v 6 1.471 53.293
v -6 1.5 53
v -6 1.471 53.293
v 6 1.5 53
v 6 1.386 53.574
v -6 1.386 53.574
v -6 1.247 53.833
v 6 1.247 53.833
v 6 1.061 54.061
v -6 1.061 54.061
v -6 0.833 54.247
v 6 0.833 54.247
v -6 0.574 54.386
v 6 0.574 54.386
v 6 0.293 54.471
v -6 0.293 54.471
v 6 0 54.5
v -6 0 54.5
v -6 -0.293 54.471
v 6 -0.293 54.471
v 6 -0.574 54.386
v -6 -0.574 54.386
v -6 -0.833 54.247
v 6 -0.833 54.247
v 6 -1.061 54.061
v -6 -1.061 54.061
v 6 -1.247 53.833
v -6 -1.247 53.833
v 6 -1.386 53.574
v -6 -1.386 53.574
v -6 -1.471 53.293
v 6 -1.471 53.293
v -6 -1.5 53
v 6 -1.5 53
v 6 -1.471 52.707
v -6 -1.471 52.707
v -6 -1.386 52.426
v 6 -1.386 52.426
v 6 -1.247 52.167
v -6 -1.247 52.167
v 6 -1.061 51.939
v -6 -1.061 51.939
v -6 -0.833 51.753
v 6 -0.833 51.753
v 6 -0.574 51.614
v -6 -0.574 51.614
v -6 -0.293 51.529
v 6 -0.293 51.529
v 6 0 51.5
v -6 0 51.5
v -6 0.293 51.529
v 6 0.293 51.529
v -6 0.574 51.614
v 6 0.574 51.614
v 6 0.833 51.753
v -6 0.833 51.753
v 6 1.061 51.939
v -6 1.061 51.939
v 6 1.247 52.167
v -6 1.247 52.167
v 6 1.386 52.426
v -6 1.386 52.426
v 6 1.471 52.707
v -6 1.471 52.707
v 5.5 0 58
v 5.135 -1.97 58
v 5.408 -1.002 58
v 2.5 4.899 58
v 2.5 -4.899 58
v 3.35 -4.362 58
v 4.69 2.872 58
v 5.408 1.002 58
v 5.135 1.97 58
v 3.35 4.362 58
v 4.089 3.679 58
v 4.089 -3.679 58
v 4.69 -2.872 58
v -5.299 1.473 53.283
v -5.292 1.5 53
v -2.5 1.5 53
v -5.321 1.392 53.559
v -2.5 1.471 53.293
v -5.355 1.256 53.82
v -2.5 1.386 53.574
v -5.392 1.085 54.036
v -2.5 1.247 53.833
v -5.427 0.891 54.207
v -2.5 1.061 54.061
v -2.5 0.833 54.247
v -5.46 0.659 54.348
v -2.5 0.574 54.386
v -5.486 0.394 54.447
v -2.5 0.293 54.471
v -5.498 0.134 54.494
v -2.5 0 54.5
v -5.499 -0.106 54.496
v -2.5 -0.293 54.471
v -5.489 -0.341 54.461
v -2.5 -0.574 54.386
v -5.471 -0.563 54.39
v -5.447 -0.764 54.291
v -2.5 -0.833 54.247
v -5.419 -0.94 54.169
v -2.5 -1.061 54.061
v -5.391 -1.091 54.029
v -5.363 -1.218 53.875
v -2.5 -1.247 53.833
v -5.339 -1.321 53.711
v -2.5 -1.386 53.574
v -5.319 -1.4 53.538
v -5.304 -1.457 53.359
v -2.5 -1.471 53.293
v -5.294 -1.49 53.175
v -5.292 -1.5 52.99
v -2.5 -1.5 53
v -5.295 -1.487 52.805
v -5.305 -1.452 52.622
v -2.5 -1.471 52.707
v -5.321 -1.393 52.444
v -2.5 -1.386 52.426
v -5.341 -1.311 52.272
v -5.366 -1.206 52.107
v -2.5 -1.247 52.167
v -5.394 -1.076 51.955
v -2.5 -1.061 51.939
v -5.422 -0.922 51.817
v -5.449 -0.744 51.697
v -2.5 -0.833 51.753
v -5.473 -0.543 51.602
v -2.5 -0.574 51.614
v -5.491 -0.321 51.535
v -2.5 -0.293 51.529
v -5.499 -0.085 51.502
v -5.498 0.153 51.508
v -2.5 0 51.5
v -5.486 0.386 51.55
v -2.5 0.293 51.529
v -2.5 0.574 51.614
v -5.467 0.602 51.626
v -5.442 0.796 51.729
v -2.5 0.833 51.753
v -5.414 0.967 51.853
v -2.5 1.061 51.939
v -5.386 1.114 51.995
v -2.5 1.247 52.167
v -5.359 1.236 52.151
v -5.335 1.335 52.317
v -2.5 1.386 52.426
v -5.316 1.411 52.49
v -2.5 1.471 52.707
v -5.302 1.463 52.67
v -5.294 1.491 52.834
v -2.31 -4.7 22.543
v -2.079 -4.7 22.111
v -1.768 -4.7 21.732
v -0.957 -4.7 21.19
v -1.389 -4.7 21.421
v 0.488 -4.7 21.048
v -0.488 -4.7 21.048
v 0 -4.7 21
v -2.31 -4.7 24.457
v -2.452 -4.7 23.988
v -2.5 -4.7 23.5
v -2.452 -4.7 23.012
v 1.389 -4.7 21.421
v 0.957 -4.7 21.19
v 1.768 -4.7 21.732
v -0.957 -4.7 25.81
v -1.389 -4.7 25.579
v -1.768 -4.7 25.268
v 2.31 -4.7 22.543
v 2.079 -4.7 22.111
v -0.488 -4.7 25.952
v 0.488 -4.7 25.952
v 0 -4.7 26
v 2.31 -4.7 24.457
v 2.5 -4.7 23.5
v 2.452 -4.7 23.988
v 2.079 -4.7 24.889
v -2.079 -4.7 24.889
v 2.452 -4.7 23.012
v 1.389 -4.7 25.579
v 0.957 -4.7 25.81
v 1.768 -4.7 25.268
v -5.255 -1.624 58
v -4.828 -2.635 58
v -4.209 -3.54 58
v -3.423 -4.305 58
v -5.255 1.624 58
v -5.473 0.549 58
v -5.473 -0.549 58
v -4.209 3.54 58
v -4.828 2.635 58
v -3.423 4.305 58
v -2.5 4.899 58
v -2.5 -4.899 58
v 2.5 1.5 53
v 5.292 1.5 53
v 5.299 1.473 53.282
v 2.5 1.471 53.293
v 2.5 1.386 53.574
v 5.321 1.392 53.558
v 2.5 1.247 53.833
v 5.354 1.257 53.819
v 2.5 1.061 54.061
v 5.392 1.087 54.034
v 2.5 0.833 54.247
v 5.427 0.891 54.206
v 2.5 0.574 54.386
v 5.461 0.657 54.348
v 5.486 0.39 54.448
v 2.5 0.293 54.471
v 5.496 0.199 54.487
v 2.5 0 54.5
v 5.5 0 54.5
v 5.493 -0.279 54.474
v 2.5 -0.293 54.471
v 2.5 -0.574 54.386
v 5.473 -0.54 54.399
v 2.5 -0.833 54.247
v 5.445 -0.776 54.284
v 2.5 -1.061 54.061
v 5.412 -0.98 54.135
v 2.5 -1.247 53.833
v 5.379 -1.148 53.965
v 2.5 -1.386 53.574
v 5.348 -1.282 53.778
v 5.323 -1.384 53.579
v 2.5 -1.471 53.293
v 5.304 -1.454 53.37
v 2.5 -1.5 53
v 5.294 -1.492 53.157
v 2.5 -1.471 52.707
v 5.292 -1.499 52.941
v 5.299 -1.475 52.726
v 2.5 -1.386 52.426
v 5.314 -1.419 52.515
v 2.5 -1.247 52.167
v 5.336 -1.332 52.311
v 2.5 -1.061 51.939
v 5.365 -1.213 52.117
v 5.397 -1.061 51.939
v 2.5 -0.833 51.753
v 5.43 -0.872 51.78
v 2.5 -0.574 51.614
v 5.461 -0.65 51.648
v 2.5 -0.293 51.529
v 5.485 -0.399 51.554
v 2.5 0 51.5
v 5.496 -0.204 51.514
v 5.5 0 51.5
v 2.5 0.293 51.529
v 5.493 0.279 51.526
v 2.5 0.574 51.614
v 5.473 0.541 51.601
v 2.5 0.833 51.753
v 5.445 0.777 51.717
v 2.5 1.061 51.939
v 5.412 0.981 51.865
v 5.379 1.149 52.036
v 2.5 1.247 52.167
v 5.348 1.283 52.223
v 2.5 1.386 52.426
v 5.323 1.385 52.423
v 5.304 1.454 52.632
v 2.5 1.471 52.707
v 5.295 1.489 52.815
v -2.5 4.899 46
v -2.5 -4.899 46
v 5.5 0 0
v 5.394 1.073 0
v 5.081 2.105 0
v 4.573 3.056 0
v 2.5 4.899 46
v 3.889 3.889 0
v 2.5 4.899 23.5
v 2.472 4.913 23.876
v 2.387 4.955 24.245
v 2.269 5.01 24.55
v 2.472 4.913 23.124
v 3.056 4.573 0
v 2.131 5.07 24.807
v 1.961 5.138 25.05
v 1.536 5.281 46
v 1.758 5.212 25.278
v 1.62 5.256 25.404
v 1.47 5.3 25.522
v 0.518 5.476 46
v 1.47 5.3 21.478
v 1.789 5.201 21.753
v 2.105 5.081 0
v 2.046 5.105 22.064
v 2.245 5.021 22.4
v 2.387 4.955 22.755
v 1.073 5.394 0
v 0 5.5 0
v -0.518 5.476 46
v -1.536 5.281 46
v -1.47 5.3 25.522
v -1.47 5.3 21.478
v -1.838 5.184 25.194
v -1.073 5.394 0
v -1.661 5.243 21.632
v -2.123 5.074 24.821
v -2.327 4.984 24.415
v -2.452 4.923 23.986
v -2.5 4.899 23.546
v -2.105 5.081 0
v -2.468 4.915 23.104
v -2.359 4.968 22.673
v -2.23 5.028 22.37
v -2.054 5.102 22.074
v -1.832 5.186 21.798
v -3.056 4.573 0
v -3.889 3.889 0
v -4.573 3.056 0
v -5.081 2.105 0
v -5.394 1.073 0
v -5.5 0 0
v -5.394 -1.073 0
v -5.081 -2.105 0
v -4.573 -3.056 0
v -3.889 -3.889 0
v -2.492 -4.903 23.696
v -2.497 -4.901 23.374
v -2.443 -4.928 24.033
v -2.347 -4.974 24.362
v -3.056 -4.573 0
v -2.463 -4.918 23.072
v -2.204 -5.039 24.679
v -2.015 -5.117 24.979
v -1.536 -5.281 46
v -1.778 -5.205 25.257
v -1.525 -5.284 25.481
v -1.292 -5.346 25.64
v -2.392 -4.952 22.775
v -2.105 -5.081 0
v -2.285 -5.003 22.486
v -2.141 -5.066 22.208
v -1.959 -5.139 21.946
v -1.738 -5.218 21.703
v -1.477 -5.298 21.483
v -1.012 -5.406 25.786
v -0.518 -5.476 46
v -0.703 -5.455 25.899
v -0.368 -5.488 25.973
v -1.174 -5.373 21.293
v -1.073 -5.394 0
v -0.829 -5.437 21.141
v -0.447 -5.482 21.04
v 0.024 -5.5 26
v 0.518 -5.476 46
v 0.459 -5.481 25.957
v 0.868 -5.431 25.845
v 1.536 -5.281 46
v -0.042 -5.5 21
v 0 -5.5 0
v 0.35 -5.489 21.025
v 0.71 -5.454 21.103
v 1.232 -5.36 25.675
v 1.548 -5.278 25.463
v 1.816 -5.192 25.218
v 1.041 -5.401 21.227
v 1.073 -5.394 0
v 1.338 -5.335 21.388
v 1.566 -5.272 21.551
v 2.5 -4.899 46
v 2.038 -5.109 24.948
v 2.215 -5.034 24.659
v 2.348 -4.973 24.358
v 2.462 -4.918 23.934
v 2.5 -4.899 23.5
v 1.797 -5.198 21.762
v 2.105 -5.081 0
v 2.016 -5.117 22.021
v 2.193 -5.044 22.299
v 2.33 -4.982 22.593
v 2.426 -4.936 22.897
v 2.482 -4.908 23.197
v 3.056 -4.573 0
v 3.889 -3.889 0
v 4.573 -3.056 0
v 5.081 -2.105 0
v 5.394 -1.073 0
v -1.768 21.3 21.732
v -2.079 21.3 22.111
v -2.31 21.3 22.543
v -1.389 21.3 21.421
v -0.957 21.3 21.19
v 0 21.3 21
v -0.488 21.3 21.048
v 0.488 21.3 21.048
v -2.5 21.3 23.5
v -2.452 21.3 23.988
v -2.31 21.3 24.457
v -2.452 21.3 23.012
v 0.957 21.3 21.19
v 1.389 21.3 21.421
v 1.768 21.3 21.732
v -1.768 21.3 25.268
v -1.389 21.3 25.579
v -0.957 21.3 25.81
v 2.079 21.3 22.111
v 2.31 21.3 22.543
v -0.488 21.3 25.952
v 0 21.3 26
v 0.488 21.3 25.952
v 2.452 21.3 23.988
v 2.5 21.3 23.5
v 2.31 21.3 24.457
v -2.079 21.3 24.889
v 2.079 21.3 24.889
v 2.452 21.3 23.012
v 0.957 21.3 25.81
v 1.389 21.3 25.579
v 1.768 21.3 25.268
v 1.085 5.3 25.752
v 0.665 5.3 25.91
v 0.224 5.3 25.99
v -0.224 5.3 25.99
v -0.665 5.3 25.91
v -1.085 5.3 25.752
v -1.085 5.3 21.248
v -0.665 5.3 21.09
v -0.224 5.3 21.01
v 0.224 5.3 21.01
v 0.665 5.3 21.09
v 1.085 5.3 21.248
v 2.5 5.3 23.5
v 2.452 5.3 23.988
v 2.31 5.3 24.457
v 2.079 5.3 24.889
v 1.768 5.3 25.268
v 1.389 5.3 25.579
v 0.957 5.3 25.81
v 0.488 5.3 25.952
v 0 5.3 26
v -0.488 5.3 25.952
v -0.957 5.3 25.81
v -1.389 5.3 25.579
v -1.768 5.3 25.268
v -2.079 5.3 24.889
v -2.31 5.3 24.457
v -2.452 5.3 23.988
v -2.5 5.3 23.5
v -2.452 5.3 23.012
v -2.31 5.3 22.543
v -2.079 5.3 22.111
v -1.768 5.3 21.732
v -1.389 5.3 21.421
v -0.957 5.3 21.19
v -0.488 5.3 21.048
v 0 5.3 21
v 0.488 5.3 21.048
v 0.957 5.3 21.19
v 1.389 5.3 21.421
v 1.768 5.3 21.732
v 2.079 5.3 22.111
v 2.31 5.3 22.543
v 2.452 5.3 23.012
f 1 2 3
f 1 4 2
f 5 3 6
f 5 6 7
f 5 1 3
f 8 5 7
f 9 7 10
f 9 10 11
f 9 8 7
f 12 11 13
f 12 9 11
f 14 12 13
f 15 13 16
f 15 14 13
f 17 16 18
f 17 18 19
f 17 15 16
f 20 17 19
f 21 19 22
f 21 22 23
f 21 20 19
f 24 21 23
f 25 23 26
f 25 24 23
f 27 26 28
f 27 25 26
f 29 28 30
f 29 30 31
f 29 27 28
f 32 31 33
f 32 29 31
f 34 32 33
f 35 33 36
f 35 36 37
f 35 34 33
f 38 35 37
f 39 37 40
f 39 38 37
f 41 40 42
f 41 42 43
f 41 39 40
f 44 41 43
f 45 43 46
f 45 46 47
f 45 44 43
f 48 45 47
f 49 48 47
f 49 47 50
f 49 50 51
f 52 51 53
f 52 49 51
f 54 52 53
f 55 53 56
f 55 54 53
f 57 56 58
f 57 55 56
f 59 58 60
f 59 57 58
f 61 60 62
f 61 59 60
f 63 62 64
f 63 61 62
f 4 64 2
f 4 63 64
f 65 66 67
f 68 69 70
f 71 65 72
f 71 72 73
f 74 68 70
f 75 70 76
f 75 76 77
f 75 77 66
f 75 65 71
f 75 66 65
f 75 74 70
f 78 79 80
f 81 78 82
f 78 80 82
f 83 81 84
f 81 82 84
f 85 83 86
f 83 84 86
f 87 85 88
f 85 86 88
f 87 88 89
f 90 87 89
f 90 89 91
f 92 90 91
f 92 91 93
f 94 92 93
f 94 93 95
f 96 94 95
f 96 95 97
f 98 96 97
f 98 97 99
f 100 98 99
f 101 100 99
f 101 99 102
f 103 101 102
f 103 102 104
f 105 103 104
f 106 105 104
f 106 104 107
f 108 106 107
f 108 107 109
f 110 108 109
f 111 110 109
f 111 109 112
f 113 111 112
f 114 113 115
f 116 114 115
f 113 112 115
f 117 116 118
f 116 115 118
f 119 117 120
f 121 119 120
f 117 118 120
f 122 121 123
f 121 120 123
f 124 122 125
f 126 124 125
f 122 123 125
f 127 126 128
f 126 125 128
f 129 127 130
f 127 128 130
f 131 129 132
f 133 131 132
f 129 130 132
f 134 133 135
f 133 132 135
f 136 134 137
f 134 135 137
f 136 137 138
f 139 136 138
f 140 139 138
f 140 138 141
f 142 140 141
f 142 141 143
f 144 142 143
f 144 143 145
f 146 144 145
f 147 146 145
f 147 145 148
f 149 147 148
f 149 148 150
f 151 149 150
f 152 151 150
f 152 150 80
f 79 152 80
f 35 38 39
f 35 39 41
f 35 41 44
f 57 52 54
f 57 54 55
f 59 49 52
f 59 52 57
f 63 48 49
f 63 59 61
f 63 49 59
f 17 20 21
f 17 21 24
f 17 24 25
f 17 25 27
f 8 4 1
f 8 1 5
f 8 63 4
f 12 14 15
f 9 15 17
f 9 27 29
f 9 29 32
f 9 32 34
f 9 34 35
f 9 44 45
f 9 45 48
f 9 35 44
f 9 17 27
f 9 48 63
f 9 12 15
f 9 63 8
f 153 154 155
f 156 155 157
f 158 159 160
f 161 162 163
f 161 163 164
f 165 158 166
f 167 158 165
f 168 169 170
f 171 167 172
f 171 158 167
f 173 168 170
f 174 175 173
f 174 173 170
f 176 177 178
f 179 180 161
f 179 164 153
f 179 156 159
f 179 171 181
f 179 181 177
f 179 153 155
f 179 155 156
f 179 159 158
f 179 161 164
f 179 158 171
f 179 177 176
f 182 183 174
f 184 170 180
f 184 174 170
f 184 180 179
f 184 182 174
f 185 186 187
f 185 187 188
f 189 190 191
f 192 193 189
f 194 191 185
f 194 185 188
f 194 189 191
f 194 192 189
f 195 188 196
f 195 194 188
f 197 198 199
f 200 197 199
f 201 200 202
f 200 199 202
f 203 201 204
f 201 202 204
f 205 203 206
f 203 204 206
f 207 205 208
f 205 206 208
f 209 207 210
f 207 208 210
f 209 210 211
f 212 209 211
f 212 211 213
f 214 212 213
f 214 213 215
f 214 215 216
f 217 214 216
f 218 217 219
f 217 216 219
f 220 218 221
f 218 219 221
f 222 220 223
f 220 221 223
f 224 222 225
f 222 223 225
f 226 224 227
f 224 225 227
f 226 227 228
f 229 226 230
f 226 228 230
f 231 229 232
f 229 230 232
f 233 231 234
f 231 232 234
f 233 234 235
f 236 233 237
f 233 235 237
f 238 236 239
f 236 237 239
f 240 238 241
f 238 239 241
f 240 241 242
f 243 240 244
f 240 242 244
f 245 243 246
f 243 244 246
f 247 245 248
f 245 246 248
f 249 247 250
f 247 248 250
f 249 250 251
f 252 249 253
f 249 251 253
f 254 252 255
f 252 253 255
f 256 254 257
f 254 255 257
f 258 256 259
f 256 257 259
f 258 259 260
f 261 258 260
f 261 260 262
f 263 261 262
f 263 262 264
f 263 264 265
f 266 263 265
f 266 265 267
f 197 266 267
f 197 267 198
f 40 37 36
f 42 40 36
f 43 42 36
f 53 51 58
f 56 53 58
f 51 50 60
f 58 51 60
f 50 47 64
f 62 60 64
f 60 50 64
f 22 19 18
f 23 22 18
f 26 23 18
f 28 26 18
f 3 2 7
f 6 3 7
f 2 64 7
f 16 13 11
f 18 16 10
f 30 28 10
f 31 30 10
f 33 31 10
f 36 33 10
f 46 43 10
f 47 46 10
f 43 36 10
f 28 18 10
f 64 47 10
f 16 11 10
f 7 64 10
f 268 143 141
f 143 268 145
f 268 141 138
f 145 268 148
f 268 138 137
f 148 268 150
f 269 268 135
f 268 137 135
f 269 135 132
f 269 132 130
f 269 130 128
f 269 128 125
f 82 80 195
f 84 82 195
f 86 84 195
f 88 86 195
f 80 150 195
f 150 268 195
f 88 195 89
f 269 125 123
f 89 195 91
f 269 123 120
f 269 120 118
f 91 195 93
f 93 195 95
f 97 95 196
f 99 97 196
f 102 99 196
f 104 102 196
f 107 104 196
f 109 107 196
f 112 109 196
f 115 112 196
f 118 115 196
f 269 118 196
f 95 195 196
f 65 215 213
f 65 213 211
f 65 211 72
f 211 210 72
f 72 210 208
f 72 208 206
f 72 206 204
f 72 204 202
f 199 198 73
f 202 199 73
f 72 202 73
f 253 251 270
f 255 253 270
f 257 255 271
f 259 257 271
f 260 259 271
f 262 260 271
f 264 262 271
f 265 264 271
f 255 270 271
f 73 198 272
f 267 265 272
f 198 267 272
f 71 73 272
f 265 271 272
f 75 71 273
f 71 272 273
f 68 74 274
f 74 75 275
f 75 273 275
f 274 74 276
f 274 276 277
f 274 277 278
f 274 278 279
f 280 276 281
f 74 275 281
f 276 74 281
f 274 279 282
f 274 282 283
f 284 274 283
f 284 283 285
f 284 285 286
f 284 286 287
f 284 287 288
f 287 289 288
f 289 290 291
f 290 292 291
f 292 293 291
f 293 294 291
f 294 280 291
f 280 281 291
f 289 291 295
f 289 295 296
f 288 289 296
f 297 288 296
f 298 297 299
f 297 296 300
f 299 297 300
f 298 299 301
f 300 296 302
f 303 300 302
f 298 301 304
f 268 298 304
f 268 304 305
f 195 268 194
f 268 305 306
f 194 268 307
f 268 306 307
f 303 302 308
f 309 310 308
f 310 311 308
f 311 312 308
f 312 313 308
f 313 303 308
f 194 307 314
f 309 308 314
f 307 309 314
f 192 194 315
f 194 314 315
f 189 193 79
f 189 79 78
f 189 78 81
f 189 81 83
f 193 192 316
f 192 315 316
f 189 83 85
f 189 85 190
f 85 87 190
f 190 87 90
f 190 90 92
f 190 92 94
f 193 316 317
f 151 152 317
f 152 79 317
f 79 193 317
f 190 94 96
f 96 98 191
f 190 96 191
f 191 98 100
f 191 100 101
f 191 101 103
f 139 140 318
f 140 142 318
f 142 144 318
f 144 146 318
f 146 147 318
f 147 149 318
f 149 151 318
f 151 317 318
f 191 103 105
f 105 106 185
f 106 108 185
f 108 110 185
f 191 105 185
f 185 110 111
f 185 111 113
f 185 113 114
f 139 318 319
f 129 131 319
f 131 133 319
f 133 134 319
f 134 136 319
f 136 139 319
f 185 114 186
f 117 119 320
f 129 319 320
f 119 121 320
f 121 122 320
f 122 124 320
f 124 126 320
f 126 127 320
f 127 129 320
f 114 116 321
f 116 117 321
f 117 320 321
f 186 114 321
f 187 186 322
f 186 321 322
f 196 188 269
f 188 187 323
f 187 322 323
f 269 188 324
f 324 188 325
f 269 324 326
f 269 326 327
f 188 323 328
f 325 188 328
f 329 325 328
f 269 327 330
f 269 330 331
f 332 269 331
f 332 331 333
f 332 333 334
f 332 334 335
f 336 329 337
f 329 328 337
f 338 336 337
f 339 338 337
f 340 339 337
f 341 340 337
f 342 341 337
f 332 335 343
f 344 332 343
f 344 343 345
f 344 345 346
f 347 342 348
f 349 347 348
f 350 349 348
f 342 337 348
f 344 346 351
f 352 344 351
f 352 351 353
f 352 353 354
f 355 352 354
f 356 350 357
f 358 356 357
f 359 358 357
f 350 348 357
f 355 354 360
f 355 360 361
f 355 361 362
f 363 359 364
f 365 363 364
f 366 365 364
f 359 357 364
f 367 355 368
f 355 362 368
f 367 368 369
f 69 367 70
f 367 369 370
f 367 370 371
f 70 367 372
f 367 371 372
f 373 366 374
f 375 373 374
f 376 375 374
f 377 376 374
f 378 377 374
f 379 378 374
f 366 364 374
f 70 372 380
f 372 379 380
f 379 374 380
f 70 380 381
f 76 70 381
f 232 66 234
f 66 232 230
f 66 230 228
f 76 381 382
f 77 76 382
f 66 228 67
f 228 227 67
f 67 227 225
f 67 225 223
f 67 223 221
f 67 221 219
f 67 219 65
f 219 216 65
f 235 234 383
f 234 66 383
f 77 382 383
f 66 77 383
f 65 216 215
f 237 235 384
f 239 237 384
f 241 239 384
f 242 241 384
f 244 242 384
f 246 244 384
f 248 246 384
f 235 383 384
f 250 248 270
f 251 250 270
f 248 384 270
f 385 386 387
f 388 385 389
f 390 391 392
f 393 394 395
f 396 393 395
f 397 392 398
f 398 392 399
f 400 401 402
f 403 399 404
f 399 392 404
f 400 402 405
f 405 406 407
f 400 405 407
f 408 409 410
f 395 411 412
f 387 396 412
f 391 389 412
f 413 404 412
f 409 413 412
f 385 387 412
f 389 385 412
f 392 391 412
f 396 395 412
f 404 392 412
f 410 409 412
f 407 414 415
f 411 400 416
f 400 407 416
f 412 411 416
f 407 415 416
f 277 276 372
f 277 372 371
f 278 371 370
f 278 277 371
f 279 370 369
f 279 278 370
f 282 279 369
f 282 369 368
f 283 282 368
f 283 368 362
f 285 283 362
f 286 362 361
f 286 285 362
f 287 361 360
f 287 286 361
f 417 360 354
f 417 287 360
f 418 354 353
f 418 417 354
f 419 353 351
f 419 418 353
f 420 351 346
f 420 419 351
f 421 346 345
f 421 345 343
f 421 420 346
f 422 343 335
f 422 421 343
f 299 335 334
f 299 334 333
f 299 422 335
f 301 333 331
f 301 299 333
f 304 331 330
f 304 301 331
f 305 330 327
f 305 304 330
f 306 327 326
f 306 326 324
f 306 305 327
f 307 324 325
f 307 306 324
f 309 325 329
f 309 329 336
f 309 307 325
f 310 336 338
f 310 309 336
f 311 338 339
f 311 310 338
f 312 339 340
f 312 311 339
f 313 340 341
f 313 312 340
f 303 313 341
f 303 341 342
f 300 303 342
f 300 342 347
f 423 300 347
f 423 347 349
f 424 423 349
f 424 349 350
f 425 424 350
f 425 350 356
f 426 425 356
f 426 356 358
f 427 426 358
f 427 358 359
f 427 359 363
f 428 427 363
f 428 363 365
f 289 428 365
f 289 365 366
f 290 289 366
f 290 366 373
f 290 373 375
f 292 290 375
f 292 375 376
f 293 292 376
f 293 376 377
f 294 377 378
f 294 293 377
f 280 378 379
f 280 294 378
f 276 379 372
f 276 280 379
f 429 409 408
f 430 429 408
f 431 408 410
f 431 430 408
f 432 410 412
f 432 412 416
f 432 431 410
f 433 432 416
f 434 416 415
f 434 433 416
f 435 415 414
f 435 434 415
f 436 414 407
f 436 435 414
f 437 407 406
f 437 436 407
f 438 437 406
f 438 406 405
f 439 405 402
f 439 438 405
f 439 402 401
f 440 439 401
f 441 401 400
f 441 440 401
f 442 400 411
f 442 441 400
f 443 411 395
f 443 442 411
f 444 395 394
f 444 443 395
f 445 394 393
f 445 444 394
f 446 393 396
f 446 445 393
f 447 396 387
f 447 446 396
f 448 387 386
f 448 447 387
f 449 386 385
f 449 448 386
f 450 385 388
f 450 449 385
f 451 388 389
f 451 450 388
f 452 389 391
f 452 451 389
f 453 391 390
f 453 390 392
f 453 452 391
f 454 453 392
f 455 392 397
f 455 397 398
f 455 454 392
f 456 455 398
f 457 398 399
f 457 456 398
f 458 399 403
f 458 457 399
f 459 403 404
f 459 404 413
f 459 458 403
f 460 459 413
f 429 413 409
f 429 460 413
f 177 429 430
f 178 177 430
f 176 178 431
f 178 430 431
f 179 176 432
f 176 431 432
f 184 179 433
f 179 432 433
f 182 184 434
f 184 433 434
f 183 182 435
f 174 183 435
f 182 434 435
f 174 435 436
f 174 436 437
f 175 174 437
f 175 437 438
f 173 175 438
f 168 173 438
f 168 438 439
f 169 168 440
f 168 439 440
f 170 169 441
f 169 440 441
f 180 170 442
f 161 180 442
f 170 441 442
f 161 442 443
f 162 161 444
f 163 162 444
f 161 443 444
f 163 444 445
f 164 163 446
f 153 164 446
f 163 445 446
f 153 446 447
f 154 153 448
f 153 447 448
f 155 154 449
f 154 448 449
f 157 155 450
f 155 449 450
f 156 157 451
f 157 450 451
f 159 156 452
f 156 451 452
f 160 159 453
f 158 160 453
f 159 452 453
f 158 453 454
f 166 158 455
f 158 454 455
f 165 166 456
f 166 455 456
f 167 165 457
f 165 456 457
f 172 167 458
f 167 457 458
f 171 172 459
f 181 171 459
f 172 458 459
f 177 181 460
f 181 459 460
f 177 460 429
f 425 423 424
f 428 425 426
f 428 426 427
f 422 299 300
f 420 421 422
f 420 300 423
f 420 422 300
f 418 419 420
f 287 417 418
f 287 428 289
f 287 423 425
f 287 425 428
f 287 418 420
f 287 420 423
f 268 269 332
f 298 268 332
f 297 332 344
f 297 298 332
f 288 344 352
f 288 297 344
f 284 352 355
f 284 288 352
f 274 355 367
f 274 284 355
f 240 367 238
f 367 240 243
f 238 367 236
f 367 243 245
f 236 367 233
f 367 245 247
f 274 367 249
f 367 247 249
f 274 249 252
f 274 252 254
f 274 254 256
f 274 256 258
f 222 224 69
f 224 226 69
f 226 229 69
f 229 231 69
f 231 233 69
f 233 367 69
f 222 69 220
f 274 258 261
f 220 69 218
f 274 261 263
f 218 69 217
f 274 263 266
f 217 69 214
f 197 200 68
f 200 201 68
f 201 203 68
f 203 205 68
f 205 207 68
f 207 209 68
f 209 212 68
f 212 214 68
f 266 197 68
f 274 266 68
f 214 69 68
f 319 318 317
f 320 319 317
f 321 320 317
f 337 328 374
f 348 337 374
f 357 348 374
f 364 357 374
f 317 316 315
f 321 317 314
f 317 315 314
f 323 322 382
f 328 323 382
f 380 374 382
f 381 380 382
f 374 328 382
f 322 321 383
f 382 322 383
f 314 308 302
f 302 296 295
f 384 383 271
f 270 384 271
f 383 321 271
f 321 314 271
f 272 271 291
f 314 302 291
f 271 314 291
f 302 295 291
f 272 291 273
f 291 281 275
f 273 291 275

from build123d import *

# Parameters (mm, degrees)
F0_R           = 5.5
F1_DEPTH       = 58
F3_DEPTH       = 12
F5_R           = 1.5
F6_DEPTH       = 11.001
F7_DEPTH       = 0.5
F7_DEPTH_BACK  = 11.5
F9_R           = 2.5
F10_DEPTH      = 10.8010001
F11_DEPTH      = 16
F11_DEPTH_BACK = 10


with BuildPart() as f1:
    # F0 (on Top) → F1 (new body)
    with BuildSketch(Plane.XY):
        Circle(F0_R)
    extrude(amount=F1_DEPTH)

    # F2 (on face) → F3 (cut)
    with BuildSketch(Plane.XY.offset(58)):
        with BuildLine():
            ThreePointArc((2.5, 4.8989794856), (0, 5.5), (-2.5, 4.8989794856))
            Line((-2.5, 4.8989794856), (-2.5, -4.8989794856))
            ThreePointArc((-2.5, -4.8989794856), (0, -5.5), (2.5, -4.8989794856))
            Line((2.5, -4.8989794856), (2.5, 4.8989794856))
        make_face()
    extrude(amount=-F3_DEPTH, mode=Mode.SUBTRACT)

    # F5 (on offset) → F6 (cut, through all)
    with BuildSketch(Plane.YZ.offset(5.5)):
        with Locations((0, 53)):
            Circle(F5_R)
    extrude(amount=-F6_DEPTH, mode=Mode.SUBTRACT)

    # F9 (on offset) → F10 (cut, through all)
    with BuildSketch(Plane.XZ.offset(-5.3)):
        with Locations((0, 23.5)):
            Circle(F9_R)
    extrude(amount=F10_DEPTH, mode=Mode.SUBTRACT)


with BuildPart() as f7:
    # F5 (on offset) → F7 (new body, two sides)
    with BuildSketch(Plane.YZ.offset(5.5)) as f7_sk:
        with Locations((0, 53)):
            Circle(F5_R)
    extrude(amount=F7_DEPTH)
    extrude(f7_sk.sketch, amount=-F7_DEPTH_BACK)


with BuildPart() as f11:
    # F9 (on offset) → F11 (new body, two sides)
    with BuildSketch(Plane.XZ.offset(-5.3)) as f11_sk:
        with Locations((0, 23.5)):
            Circle(F9_R)
    extrude(amount=-F11_DEPTH)
    extrude(f11_sk.sketch, amount=F11_DEPTH_BACK)


solid = Compound([f1.part, f7.part, f11.part])
